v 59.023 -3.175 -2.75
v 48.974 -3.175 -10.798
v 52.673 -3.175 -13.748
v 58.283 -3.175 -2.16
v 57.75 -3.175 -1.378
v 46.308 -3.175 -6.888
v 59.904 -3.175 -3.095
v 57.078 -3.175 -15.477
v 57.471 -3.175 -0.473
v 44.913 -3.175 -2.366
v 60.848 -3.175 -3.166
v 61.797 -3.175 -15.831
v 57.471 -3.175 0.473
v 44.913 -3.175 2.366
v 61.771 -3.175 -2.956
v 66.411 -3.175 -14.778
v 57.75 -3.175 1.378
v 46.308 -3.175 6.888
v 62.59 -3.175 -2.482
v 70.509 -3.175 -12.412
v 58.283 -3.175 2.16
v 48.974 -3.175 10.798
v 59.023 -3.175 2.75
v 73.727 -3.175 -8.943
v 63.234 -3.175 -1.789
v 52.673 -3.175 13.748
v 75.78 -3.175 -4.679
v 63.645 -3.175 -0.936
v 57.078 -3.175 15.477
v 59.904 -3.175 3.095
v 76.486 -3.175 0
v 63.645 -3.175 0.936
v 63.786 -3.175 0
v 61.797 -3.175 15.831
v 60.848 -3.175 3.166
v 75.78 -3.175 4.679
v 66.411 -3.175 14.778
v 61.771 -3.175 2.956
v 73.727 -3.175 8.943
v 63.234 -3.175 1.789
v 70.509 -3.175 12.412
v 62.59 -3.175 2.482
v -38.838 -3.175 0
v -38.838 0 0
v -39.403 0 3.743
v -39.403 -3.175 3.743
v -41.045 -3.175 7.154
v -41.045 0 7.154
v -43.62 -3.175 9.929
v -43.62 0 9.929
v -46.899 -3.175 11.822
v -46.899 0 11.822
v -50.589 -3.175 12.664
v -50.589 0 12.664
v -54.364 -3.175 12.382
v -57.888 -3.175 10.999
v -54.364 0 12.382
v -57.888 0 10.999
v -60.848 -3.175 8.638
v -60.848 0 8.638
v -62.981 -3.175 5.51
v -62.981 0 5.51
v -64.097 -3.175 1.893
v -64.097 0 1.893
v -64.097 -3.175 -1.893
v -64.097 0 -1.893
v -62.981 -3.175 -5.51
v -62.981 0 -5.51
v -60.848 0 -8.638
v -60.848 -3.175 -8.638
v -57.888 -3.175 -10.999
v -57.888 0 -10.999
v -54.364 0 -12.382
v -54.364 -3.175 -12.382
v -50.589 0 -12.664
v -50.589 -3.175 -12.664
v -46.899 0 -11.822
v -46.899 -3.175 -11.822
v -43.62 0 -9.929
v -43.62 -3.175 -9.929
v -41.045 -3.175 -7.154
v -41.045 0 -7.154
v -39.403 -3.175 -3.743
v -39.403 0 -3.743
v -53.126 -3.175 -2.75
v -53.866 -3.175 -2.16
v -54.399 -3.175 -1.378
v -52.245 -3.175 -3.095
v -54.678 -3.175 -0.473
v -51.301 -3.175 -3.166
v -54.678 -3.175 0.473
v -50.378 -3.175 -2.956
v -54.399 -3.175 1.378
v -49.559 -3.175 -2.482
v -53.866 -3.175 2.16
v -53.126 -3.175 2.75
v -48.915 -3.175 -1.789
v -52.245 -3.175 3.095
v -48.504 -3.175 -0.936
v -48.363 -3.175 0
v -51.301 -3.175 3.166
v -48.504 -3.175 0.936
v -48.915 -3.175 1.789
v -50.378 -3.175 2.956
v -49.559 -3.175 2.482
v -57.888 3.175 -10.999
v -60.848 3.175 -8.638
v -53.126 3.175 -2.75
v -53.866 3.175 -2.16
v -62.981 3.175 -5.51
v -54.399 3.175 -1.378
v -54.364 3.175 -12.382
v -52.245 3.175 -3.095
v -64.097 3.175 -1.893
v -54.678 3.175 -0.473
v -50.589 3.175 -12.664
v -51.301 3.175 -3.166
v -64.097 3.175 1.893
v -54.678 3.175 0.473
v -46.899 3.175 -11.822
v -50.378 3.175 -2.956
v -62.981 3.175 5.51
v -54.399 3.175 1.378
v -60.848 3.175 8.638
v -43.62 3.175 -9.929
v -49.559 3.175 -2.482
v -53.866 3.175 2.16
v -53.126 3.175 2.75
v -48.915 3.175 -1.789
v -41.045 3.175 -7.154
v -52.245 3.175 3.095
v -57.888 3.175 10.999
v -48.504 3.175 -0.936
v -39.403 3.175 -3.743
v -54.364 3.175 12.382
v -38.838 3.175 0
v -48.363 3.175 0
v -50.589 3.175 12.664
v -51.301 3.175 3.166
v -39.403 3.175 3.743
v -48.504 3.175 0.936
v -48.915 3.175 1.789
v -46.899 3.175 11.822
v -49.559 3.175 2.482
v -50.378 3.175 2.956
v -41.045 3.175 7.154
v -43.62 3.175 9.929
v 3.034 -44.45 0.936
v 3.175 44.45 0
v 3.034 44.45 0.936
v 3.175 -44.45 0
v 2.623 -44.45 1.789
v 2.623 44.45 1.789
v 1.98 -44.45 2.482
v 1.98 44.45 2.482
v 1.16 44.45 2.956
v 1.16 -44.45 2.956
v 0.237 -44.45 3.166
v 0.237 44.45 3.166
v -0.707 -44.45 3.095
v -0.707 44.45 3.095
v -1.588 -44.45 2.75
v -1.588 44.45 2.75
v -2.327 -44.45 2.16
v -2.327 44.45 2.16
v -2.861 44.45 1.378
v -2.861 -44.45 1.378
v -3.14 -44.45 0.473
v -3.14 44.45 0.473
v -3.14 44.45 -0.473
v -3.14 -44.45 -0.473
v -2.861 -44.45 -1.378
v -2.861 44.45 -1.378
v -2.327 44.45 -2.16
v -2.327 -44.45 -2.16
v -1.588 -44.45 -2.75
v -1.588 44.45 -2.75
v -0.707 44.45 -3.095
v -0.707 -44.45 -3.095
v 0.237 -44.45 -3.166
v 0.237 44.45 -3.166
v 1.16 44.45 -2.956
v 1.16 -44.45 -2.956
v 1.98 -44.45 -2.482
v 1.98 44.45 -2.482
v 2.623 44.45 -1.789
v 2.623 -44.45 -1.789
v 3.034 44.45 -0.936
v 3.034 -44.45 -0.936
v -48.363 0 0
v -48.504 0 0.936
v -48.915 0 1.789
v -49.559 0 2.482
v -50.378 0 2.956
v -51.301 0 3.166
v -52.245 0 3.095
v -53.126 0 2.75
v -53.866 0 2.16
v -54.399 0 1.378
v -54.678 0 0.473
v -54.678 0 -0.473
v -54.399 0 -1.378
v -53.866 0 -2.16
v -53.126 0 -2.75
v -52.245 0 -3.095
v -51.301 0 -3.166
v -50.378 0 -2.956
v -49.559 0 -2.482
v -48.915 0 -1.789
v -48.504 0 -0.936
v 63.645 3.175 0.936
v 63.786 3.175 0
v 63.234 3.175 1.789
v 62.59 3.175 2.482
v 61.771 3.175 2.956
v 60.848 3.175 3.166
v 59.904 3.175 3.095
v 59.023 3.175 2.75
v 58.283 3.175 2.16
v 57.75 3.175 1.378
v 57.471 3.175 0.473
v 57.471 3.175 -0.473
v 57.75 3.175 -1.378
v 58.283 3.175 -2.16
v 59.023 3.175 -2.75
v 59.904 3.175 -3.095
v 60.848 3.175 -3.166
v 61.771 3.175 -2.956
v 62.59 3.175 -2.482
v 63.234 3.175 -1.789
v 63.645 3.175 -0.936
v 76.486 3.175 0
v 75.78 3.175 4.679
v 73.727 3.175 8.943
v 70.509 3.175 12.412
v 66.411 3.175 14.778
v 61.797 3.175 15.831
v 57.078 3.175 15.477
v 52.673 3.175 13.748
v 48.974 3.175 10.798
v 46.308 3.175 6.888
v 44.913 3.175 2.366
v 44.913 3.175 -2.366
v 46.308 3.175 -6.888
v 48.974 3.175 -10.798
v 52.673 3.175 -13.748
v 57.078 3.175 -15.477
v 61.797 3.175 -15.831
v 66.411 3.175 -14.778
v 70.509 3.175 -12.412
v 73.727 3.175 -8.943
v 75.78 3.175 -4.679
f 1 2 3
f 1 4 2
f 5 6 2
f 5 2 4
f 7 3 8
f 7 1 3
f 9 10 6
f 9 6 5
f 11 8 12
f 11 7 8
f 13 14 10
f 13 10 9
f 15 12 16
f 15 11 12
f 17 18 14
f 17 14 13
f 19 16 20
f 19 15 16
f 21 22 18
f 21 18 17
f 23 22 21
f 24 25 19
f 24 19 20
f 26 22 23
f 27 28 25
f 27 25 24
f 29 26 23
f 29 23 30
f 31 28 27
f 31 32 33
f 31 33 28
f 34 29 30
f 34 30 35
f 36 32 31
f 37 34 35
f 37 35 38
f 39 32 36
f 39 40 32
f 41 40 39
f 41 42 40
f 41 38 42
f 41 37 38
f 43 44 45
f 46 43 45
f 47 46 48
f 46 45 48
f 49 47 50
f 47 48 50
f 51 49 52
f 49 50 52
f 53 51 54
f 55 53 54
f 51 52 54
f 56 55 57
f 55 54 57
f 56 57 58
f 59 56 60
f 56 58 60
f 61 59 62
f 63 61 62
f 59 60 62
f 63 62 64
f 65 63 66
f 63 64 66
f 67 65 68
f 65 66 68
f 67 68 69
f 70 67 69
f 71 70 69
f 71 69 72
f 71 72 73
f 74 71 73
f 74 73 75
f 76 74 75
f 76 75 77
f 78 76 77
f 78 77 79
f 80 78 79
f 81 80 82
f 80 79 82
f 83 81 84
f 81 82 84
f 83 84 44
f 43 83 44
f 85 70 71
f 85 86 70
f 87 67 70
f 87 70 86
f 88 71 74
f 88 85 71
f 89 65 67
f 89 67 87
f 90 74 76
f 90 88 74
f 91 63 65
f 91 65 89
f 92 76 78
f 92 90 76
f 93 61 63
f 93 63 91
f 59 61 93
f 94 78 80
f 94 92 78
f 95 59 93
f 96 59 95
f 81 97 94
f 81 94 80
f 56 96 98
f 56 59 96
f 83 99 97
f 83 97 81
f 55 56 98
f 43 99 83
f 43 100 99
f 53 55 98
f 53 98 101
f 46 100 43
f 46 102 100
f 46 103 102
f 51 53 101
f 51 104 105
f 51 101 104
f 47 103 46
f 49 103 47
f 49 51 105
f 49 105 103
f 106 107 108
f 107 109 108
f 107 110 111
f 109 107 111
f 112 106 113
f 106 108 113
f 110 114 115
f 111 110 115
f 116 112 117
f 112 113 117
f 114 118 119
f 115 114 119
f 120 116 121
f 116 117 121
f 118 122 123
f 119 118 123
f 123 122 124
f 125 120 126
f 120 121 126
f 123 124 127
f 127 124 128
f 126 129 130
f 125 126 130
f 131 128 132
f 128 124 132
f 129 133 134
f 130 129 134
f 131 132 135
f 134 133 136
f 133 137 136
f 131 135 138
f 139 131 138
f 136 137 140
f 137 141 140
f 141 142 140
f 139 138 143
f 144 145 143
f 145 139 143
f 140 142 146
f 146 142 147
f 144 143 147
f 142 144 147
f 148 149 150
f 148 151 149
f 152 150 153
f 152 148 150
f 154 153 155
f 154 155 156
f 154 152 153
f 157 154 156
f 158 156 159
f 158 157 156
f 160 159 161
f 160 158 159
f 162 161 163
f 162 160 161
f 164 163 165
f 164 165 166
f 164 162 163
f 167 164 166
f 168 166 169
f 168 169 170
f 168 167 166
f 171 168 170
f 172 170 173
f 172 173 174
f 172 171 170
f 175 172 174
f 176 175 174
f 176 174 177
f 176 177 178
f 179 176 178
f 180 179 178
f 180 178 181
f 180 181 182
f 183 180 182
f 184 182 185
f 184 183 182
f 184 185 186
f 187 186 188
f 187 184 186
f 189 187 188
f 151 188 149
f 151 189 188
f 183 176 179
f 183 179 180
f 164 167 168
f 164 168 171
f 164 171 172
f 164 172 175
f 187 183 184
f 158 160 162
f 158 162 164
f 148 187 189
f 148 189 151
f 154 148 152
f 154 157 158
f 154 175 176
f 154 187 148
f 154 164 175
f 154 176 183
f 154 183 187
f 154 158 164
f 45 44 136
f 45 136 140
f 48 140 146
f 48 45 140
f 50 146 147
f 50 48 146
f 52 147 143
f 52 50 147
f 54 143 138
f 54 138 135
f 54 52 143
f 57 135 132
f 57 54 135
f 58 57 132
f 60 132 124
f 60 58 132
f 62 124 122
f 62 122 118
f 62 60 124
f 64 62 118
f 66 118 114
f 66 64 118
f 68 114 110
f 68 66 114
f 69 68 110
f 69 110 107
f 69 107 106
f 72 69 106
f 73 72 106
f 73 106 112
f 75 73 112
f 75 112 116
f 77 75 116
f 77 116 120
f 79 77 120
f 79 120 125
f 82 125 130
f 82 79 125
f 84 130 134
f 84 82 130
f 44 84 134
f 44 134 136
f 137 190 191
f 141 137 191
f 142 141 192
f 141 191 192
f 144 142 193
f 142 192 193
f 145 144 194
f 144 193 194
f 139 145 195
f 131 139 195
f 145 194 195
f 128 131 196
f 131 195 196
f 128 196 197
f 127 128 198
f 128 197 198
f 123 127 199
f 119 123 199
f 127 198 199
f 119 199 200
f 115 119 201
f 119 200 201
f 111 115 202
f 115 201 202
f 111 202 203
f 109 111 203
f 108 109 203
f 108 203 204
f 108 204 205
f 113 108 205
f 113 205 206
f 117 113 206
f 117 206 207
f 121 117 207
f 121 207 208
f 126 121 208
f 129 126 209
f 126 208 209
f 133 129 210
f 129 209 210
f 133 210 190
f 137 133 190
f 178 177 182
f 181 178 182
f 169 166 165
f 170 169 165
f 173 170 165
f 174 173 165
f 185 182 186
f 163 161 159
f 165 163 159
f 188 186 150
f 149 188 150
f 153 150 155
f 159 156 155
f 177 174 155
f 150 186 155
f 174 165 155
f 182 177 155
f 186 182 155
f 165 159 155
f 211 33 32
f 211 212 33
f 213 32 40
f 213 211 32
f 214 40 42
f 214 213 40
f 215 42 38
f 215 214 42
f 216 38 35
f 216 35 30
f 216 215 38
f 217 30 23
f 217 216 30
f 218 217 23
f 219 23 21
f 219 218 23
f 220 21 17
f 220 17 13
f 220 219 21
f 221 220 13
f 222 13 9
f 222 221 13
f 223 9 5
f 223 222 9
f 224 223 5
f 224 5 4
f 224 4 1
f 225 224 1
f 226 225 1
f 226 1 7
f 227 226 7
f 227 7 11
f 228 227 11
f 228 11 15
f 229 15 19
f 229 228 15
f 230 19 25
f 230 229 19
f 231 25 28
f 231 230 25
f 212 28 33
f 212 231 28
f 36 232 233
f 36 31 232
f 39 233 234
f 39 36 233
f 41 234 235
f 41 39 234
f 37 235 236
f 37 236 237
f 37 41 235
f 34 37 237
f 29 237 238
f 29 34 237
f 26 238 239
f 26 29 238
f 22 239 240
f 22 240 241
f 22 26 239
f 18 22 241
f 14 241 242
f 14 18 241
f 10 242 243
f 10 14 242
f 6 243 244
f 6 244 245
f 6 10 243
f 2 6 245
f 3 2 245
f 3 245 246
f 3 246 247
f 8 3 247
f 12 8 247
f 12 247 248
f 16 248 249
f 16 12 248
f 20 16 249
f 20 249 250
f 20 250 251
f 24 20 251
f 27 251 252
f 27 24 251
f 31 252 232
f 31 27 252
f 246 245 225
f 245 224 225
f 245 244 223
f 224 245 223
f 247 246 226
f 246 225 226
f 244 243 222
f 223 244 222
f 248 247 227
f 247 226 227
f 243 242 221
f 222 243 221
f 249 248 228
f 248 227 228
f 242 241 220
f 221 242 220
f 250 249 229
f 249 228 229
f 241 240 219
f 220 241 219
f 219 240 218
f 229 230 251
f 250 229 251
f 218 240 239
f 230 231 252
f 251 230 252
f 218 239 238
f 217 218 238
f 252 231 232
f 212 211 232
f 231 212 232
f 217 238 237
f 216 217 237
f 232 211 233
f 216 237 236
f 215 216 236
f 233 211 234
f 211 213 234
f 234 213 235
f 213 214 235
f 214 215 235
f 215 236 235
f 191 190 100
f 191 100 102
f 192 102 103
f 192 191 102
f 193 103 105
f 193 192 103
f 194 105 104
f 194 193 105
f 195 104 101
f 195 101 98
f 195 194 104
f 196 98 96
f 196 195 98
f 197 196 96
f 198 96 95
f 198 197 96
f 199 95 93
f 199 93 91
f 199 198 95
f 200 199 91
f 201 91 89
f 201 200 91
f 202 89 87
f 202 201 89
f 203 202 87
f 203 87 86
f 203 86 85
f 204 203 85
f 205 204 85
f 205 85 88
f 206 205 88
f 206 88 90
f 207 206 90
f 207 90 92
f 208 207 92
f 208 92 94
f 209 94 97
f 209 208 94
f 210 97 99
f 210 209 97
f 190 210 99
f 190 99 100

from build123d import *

# Parameters (mm, degrees)
F0_R     = 12.7
F0_R_2   = 3.175
F0_R_3   = 15.875
F1_DEPTH = 3.175
F2_DEPTH = 44.45


with BuildPart() as f1:
    # F0 (on Front) → F1 (new body, symmetric)
    with BuildSketch(Plane.XZ):
        with Locations((-51.538408, 0)):
            Circle(F0_R)
        with Locations((-51.538408, 0)):
            Circle(F0_R_2, mode=Mode.SUBTRACT)
        with Locations((60.610715, 0)):
            Circle(F0_R_3)
        with Locations((60.610715, 0)):
            Circle(F0_R_2, mode=Mode.SUBTRACT)
    extrude(amount=F1_DEPTH, both=True)


with BuildPart() as f2:
    # F0 (on Front) → F2 (new body, symmetric)
    with BuildSketch(Plane.XZ):
        Circle(F0_R_2)
    extrude(amount=F2_DEPTH, both=True)


solid = Compound([f1.part, f2.part])
